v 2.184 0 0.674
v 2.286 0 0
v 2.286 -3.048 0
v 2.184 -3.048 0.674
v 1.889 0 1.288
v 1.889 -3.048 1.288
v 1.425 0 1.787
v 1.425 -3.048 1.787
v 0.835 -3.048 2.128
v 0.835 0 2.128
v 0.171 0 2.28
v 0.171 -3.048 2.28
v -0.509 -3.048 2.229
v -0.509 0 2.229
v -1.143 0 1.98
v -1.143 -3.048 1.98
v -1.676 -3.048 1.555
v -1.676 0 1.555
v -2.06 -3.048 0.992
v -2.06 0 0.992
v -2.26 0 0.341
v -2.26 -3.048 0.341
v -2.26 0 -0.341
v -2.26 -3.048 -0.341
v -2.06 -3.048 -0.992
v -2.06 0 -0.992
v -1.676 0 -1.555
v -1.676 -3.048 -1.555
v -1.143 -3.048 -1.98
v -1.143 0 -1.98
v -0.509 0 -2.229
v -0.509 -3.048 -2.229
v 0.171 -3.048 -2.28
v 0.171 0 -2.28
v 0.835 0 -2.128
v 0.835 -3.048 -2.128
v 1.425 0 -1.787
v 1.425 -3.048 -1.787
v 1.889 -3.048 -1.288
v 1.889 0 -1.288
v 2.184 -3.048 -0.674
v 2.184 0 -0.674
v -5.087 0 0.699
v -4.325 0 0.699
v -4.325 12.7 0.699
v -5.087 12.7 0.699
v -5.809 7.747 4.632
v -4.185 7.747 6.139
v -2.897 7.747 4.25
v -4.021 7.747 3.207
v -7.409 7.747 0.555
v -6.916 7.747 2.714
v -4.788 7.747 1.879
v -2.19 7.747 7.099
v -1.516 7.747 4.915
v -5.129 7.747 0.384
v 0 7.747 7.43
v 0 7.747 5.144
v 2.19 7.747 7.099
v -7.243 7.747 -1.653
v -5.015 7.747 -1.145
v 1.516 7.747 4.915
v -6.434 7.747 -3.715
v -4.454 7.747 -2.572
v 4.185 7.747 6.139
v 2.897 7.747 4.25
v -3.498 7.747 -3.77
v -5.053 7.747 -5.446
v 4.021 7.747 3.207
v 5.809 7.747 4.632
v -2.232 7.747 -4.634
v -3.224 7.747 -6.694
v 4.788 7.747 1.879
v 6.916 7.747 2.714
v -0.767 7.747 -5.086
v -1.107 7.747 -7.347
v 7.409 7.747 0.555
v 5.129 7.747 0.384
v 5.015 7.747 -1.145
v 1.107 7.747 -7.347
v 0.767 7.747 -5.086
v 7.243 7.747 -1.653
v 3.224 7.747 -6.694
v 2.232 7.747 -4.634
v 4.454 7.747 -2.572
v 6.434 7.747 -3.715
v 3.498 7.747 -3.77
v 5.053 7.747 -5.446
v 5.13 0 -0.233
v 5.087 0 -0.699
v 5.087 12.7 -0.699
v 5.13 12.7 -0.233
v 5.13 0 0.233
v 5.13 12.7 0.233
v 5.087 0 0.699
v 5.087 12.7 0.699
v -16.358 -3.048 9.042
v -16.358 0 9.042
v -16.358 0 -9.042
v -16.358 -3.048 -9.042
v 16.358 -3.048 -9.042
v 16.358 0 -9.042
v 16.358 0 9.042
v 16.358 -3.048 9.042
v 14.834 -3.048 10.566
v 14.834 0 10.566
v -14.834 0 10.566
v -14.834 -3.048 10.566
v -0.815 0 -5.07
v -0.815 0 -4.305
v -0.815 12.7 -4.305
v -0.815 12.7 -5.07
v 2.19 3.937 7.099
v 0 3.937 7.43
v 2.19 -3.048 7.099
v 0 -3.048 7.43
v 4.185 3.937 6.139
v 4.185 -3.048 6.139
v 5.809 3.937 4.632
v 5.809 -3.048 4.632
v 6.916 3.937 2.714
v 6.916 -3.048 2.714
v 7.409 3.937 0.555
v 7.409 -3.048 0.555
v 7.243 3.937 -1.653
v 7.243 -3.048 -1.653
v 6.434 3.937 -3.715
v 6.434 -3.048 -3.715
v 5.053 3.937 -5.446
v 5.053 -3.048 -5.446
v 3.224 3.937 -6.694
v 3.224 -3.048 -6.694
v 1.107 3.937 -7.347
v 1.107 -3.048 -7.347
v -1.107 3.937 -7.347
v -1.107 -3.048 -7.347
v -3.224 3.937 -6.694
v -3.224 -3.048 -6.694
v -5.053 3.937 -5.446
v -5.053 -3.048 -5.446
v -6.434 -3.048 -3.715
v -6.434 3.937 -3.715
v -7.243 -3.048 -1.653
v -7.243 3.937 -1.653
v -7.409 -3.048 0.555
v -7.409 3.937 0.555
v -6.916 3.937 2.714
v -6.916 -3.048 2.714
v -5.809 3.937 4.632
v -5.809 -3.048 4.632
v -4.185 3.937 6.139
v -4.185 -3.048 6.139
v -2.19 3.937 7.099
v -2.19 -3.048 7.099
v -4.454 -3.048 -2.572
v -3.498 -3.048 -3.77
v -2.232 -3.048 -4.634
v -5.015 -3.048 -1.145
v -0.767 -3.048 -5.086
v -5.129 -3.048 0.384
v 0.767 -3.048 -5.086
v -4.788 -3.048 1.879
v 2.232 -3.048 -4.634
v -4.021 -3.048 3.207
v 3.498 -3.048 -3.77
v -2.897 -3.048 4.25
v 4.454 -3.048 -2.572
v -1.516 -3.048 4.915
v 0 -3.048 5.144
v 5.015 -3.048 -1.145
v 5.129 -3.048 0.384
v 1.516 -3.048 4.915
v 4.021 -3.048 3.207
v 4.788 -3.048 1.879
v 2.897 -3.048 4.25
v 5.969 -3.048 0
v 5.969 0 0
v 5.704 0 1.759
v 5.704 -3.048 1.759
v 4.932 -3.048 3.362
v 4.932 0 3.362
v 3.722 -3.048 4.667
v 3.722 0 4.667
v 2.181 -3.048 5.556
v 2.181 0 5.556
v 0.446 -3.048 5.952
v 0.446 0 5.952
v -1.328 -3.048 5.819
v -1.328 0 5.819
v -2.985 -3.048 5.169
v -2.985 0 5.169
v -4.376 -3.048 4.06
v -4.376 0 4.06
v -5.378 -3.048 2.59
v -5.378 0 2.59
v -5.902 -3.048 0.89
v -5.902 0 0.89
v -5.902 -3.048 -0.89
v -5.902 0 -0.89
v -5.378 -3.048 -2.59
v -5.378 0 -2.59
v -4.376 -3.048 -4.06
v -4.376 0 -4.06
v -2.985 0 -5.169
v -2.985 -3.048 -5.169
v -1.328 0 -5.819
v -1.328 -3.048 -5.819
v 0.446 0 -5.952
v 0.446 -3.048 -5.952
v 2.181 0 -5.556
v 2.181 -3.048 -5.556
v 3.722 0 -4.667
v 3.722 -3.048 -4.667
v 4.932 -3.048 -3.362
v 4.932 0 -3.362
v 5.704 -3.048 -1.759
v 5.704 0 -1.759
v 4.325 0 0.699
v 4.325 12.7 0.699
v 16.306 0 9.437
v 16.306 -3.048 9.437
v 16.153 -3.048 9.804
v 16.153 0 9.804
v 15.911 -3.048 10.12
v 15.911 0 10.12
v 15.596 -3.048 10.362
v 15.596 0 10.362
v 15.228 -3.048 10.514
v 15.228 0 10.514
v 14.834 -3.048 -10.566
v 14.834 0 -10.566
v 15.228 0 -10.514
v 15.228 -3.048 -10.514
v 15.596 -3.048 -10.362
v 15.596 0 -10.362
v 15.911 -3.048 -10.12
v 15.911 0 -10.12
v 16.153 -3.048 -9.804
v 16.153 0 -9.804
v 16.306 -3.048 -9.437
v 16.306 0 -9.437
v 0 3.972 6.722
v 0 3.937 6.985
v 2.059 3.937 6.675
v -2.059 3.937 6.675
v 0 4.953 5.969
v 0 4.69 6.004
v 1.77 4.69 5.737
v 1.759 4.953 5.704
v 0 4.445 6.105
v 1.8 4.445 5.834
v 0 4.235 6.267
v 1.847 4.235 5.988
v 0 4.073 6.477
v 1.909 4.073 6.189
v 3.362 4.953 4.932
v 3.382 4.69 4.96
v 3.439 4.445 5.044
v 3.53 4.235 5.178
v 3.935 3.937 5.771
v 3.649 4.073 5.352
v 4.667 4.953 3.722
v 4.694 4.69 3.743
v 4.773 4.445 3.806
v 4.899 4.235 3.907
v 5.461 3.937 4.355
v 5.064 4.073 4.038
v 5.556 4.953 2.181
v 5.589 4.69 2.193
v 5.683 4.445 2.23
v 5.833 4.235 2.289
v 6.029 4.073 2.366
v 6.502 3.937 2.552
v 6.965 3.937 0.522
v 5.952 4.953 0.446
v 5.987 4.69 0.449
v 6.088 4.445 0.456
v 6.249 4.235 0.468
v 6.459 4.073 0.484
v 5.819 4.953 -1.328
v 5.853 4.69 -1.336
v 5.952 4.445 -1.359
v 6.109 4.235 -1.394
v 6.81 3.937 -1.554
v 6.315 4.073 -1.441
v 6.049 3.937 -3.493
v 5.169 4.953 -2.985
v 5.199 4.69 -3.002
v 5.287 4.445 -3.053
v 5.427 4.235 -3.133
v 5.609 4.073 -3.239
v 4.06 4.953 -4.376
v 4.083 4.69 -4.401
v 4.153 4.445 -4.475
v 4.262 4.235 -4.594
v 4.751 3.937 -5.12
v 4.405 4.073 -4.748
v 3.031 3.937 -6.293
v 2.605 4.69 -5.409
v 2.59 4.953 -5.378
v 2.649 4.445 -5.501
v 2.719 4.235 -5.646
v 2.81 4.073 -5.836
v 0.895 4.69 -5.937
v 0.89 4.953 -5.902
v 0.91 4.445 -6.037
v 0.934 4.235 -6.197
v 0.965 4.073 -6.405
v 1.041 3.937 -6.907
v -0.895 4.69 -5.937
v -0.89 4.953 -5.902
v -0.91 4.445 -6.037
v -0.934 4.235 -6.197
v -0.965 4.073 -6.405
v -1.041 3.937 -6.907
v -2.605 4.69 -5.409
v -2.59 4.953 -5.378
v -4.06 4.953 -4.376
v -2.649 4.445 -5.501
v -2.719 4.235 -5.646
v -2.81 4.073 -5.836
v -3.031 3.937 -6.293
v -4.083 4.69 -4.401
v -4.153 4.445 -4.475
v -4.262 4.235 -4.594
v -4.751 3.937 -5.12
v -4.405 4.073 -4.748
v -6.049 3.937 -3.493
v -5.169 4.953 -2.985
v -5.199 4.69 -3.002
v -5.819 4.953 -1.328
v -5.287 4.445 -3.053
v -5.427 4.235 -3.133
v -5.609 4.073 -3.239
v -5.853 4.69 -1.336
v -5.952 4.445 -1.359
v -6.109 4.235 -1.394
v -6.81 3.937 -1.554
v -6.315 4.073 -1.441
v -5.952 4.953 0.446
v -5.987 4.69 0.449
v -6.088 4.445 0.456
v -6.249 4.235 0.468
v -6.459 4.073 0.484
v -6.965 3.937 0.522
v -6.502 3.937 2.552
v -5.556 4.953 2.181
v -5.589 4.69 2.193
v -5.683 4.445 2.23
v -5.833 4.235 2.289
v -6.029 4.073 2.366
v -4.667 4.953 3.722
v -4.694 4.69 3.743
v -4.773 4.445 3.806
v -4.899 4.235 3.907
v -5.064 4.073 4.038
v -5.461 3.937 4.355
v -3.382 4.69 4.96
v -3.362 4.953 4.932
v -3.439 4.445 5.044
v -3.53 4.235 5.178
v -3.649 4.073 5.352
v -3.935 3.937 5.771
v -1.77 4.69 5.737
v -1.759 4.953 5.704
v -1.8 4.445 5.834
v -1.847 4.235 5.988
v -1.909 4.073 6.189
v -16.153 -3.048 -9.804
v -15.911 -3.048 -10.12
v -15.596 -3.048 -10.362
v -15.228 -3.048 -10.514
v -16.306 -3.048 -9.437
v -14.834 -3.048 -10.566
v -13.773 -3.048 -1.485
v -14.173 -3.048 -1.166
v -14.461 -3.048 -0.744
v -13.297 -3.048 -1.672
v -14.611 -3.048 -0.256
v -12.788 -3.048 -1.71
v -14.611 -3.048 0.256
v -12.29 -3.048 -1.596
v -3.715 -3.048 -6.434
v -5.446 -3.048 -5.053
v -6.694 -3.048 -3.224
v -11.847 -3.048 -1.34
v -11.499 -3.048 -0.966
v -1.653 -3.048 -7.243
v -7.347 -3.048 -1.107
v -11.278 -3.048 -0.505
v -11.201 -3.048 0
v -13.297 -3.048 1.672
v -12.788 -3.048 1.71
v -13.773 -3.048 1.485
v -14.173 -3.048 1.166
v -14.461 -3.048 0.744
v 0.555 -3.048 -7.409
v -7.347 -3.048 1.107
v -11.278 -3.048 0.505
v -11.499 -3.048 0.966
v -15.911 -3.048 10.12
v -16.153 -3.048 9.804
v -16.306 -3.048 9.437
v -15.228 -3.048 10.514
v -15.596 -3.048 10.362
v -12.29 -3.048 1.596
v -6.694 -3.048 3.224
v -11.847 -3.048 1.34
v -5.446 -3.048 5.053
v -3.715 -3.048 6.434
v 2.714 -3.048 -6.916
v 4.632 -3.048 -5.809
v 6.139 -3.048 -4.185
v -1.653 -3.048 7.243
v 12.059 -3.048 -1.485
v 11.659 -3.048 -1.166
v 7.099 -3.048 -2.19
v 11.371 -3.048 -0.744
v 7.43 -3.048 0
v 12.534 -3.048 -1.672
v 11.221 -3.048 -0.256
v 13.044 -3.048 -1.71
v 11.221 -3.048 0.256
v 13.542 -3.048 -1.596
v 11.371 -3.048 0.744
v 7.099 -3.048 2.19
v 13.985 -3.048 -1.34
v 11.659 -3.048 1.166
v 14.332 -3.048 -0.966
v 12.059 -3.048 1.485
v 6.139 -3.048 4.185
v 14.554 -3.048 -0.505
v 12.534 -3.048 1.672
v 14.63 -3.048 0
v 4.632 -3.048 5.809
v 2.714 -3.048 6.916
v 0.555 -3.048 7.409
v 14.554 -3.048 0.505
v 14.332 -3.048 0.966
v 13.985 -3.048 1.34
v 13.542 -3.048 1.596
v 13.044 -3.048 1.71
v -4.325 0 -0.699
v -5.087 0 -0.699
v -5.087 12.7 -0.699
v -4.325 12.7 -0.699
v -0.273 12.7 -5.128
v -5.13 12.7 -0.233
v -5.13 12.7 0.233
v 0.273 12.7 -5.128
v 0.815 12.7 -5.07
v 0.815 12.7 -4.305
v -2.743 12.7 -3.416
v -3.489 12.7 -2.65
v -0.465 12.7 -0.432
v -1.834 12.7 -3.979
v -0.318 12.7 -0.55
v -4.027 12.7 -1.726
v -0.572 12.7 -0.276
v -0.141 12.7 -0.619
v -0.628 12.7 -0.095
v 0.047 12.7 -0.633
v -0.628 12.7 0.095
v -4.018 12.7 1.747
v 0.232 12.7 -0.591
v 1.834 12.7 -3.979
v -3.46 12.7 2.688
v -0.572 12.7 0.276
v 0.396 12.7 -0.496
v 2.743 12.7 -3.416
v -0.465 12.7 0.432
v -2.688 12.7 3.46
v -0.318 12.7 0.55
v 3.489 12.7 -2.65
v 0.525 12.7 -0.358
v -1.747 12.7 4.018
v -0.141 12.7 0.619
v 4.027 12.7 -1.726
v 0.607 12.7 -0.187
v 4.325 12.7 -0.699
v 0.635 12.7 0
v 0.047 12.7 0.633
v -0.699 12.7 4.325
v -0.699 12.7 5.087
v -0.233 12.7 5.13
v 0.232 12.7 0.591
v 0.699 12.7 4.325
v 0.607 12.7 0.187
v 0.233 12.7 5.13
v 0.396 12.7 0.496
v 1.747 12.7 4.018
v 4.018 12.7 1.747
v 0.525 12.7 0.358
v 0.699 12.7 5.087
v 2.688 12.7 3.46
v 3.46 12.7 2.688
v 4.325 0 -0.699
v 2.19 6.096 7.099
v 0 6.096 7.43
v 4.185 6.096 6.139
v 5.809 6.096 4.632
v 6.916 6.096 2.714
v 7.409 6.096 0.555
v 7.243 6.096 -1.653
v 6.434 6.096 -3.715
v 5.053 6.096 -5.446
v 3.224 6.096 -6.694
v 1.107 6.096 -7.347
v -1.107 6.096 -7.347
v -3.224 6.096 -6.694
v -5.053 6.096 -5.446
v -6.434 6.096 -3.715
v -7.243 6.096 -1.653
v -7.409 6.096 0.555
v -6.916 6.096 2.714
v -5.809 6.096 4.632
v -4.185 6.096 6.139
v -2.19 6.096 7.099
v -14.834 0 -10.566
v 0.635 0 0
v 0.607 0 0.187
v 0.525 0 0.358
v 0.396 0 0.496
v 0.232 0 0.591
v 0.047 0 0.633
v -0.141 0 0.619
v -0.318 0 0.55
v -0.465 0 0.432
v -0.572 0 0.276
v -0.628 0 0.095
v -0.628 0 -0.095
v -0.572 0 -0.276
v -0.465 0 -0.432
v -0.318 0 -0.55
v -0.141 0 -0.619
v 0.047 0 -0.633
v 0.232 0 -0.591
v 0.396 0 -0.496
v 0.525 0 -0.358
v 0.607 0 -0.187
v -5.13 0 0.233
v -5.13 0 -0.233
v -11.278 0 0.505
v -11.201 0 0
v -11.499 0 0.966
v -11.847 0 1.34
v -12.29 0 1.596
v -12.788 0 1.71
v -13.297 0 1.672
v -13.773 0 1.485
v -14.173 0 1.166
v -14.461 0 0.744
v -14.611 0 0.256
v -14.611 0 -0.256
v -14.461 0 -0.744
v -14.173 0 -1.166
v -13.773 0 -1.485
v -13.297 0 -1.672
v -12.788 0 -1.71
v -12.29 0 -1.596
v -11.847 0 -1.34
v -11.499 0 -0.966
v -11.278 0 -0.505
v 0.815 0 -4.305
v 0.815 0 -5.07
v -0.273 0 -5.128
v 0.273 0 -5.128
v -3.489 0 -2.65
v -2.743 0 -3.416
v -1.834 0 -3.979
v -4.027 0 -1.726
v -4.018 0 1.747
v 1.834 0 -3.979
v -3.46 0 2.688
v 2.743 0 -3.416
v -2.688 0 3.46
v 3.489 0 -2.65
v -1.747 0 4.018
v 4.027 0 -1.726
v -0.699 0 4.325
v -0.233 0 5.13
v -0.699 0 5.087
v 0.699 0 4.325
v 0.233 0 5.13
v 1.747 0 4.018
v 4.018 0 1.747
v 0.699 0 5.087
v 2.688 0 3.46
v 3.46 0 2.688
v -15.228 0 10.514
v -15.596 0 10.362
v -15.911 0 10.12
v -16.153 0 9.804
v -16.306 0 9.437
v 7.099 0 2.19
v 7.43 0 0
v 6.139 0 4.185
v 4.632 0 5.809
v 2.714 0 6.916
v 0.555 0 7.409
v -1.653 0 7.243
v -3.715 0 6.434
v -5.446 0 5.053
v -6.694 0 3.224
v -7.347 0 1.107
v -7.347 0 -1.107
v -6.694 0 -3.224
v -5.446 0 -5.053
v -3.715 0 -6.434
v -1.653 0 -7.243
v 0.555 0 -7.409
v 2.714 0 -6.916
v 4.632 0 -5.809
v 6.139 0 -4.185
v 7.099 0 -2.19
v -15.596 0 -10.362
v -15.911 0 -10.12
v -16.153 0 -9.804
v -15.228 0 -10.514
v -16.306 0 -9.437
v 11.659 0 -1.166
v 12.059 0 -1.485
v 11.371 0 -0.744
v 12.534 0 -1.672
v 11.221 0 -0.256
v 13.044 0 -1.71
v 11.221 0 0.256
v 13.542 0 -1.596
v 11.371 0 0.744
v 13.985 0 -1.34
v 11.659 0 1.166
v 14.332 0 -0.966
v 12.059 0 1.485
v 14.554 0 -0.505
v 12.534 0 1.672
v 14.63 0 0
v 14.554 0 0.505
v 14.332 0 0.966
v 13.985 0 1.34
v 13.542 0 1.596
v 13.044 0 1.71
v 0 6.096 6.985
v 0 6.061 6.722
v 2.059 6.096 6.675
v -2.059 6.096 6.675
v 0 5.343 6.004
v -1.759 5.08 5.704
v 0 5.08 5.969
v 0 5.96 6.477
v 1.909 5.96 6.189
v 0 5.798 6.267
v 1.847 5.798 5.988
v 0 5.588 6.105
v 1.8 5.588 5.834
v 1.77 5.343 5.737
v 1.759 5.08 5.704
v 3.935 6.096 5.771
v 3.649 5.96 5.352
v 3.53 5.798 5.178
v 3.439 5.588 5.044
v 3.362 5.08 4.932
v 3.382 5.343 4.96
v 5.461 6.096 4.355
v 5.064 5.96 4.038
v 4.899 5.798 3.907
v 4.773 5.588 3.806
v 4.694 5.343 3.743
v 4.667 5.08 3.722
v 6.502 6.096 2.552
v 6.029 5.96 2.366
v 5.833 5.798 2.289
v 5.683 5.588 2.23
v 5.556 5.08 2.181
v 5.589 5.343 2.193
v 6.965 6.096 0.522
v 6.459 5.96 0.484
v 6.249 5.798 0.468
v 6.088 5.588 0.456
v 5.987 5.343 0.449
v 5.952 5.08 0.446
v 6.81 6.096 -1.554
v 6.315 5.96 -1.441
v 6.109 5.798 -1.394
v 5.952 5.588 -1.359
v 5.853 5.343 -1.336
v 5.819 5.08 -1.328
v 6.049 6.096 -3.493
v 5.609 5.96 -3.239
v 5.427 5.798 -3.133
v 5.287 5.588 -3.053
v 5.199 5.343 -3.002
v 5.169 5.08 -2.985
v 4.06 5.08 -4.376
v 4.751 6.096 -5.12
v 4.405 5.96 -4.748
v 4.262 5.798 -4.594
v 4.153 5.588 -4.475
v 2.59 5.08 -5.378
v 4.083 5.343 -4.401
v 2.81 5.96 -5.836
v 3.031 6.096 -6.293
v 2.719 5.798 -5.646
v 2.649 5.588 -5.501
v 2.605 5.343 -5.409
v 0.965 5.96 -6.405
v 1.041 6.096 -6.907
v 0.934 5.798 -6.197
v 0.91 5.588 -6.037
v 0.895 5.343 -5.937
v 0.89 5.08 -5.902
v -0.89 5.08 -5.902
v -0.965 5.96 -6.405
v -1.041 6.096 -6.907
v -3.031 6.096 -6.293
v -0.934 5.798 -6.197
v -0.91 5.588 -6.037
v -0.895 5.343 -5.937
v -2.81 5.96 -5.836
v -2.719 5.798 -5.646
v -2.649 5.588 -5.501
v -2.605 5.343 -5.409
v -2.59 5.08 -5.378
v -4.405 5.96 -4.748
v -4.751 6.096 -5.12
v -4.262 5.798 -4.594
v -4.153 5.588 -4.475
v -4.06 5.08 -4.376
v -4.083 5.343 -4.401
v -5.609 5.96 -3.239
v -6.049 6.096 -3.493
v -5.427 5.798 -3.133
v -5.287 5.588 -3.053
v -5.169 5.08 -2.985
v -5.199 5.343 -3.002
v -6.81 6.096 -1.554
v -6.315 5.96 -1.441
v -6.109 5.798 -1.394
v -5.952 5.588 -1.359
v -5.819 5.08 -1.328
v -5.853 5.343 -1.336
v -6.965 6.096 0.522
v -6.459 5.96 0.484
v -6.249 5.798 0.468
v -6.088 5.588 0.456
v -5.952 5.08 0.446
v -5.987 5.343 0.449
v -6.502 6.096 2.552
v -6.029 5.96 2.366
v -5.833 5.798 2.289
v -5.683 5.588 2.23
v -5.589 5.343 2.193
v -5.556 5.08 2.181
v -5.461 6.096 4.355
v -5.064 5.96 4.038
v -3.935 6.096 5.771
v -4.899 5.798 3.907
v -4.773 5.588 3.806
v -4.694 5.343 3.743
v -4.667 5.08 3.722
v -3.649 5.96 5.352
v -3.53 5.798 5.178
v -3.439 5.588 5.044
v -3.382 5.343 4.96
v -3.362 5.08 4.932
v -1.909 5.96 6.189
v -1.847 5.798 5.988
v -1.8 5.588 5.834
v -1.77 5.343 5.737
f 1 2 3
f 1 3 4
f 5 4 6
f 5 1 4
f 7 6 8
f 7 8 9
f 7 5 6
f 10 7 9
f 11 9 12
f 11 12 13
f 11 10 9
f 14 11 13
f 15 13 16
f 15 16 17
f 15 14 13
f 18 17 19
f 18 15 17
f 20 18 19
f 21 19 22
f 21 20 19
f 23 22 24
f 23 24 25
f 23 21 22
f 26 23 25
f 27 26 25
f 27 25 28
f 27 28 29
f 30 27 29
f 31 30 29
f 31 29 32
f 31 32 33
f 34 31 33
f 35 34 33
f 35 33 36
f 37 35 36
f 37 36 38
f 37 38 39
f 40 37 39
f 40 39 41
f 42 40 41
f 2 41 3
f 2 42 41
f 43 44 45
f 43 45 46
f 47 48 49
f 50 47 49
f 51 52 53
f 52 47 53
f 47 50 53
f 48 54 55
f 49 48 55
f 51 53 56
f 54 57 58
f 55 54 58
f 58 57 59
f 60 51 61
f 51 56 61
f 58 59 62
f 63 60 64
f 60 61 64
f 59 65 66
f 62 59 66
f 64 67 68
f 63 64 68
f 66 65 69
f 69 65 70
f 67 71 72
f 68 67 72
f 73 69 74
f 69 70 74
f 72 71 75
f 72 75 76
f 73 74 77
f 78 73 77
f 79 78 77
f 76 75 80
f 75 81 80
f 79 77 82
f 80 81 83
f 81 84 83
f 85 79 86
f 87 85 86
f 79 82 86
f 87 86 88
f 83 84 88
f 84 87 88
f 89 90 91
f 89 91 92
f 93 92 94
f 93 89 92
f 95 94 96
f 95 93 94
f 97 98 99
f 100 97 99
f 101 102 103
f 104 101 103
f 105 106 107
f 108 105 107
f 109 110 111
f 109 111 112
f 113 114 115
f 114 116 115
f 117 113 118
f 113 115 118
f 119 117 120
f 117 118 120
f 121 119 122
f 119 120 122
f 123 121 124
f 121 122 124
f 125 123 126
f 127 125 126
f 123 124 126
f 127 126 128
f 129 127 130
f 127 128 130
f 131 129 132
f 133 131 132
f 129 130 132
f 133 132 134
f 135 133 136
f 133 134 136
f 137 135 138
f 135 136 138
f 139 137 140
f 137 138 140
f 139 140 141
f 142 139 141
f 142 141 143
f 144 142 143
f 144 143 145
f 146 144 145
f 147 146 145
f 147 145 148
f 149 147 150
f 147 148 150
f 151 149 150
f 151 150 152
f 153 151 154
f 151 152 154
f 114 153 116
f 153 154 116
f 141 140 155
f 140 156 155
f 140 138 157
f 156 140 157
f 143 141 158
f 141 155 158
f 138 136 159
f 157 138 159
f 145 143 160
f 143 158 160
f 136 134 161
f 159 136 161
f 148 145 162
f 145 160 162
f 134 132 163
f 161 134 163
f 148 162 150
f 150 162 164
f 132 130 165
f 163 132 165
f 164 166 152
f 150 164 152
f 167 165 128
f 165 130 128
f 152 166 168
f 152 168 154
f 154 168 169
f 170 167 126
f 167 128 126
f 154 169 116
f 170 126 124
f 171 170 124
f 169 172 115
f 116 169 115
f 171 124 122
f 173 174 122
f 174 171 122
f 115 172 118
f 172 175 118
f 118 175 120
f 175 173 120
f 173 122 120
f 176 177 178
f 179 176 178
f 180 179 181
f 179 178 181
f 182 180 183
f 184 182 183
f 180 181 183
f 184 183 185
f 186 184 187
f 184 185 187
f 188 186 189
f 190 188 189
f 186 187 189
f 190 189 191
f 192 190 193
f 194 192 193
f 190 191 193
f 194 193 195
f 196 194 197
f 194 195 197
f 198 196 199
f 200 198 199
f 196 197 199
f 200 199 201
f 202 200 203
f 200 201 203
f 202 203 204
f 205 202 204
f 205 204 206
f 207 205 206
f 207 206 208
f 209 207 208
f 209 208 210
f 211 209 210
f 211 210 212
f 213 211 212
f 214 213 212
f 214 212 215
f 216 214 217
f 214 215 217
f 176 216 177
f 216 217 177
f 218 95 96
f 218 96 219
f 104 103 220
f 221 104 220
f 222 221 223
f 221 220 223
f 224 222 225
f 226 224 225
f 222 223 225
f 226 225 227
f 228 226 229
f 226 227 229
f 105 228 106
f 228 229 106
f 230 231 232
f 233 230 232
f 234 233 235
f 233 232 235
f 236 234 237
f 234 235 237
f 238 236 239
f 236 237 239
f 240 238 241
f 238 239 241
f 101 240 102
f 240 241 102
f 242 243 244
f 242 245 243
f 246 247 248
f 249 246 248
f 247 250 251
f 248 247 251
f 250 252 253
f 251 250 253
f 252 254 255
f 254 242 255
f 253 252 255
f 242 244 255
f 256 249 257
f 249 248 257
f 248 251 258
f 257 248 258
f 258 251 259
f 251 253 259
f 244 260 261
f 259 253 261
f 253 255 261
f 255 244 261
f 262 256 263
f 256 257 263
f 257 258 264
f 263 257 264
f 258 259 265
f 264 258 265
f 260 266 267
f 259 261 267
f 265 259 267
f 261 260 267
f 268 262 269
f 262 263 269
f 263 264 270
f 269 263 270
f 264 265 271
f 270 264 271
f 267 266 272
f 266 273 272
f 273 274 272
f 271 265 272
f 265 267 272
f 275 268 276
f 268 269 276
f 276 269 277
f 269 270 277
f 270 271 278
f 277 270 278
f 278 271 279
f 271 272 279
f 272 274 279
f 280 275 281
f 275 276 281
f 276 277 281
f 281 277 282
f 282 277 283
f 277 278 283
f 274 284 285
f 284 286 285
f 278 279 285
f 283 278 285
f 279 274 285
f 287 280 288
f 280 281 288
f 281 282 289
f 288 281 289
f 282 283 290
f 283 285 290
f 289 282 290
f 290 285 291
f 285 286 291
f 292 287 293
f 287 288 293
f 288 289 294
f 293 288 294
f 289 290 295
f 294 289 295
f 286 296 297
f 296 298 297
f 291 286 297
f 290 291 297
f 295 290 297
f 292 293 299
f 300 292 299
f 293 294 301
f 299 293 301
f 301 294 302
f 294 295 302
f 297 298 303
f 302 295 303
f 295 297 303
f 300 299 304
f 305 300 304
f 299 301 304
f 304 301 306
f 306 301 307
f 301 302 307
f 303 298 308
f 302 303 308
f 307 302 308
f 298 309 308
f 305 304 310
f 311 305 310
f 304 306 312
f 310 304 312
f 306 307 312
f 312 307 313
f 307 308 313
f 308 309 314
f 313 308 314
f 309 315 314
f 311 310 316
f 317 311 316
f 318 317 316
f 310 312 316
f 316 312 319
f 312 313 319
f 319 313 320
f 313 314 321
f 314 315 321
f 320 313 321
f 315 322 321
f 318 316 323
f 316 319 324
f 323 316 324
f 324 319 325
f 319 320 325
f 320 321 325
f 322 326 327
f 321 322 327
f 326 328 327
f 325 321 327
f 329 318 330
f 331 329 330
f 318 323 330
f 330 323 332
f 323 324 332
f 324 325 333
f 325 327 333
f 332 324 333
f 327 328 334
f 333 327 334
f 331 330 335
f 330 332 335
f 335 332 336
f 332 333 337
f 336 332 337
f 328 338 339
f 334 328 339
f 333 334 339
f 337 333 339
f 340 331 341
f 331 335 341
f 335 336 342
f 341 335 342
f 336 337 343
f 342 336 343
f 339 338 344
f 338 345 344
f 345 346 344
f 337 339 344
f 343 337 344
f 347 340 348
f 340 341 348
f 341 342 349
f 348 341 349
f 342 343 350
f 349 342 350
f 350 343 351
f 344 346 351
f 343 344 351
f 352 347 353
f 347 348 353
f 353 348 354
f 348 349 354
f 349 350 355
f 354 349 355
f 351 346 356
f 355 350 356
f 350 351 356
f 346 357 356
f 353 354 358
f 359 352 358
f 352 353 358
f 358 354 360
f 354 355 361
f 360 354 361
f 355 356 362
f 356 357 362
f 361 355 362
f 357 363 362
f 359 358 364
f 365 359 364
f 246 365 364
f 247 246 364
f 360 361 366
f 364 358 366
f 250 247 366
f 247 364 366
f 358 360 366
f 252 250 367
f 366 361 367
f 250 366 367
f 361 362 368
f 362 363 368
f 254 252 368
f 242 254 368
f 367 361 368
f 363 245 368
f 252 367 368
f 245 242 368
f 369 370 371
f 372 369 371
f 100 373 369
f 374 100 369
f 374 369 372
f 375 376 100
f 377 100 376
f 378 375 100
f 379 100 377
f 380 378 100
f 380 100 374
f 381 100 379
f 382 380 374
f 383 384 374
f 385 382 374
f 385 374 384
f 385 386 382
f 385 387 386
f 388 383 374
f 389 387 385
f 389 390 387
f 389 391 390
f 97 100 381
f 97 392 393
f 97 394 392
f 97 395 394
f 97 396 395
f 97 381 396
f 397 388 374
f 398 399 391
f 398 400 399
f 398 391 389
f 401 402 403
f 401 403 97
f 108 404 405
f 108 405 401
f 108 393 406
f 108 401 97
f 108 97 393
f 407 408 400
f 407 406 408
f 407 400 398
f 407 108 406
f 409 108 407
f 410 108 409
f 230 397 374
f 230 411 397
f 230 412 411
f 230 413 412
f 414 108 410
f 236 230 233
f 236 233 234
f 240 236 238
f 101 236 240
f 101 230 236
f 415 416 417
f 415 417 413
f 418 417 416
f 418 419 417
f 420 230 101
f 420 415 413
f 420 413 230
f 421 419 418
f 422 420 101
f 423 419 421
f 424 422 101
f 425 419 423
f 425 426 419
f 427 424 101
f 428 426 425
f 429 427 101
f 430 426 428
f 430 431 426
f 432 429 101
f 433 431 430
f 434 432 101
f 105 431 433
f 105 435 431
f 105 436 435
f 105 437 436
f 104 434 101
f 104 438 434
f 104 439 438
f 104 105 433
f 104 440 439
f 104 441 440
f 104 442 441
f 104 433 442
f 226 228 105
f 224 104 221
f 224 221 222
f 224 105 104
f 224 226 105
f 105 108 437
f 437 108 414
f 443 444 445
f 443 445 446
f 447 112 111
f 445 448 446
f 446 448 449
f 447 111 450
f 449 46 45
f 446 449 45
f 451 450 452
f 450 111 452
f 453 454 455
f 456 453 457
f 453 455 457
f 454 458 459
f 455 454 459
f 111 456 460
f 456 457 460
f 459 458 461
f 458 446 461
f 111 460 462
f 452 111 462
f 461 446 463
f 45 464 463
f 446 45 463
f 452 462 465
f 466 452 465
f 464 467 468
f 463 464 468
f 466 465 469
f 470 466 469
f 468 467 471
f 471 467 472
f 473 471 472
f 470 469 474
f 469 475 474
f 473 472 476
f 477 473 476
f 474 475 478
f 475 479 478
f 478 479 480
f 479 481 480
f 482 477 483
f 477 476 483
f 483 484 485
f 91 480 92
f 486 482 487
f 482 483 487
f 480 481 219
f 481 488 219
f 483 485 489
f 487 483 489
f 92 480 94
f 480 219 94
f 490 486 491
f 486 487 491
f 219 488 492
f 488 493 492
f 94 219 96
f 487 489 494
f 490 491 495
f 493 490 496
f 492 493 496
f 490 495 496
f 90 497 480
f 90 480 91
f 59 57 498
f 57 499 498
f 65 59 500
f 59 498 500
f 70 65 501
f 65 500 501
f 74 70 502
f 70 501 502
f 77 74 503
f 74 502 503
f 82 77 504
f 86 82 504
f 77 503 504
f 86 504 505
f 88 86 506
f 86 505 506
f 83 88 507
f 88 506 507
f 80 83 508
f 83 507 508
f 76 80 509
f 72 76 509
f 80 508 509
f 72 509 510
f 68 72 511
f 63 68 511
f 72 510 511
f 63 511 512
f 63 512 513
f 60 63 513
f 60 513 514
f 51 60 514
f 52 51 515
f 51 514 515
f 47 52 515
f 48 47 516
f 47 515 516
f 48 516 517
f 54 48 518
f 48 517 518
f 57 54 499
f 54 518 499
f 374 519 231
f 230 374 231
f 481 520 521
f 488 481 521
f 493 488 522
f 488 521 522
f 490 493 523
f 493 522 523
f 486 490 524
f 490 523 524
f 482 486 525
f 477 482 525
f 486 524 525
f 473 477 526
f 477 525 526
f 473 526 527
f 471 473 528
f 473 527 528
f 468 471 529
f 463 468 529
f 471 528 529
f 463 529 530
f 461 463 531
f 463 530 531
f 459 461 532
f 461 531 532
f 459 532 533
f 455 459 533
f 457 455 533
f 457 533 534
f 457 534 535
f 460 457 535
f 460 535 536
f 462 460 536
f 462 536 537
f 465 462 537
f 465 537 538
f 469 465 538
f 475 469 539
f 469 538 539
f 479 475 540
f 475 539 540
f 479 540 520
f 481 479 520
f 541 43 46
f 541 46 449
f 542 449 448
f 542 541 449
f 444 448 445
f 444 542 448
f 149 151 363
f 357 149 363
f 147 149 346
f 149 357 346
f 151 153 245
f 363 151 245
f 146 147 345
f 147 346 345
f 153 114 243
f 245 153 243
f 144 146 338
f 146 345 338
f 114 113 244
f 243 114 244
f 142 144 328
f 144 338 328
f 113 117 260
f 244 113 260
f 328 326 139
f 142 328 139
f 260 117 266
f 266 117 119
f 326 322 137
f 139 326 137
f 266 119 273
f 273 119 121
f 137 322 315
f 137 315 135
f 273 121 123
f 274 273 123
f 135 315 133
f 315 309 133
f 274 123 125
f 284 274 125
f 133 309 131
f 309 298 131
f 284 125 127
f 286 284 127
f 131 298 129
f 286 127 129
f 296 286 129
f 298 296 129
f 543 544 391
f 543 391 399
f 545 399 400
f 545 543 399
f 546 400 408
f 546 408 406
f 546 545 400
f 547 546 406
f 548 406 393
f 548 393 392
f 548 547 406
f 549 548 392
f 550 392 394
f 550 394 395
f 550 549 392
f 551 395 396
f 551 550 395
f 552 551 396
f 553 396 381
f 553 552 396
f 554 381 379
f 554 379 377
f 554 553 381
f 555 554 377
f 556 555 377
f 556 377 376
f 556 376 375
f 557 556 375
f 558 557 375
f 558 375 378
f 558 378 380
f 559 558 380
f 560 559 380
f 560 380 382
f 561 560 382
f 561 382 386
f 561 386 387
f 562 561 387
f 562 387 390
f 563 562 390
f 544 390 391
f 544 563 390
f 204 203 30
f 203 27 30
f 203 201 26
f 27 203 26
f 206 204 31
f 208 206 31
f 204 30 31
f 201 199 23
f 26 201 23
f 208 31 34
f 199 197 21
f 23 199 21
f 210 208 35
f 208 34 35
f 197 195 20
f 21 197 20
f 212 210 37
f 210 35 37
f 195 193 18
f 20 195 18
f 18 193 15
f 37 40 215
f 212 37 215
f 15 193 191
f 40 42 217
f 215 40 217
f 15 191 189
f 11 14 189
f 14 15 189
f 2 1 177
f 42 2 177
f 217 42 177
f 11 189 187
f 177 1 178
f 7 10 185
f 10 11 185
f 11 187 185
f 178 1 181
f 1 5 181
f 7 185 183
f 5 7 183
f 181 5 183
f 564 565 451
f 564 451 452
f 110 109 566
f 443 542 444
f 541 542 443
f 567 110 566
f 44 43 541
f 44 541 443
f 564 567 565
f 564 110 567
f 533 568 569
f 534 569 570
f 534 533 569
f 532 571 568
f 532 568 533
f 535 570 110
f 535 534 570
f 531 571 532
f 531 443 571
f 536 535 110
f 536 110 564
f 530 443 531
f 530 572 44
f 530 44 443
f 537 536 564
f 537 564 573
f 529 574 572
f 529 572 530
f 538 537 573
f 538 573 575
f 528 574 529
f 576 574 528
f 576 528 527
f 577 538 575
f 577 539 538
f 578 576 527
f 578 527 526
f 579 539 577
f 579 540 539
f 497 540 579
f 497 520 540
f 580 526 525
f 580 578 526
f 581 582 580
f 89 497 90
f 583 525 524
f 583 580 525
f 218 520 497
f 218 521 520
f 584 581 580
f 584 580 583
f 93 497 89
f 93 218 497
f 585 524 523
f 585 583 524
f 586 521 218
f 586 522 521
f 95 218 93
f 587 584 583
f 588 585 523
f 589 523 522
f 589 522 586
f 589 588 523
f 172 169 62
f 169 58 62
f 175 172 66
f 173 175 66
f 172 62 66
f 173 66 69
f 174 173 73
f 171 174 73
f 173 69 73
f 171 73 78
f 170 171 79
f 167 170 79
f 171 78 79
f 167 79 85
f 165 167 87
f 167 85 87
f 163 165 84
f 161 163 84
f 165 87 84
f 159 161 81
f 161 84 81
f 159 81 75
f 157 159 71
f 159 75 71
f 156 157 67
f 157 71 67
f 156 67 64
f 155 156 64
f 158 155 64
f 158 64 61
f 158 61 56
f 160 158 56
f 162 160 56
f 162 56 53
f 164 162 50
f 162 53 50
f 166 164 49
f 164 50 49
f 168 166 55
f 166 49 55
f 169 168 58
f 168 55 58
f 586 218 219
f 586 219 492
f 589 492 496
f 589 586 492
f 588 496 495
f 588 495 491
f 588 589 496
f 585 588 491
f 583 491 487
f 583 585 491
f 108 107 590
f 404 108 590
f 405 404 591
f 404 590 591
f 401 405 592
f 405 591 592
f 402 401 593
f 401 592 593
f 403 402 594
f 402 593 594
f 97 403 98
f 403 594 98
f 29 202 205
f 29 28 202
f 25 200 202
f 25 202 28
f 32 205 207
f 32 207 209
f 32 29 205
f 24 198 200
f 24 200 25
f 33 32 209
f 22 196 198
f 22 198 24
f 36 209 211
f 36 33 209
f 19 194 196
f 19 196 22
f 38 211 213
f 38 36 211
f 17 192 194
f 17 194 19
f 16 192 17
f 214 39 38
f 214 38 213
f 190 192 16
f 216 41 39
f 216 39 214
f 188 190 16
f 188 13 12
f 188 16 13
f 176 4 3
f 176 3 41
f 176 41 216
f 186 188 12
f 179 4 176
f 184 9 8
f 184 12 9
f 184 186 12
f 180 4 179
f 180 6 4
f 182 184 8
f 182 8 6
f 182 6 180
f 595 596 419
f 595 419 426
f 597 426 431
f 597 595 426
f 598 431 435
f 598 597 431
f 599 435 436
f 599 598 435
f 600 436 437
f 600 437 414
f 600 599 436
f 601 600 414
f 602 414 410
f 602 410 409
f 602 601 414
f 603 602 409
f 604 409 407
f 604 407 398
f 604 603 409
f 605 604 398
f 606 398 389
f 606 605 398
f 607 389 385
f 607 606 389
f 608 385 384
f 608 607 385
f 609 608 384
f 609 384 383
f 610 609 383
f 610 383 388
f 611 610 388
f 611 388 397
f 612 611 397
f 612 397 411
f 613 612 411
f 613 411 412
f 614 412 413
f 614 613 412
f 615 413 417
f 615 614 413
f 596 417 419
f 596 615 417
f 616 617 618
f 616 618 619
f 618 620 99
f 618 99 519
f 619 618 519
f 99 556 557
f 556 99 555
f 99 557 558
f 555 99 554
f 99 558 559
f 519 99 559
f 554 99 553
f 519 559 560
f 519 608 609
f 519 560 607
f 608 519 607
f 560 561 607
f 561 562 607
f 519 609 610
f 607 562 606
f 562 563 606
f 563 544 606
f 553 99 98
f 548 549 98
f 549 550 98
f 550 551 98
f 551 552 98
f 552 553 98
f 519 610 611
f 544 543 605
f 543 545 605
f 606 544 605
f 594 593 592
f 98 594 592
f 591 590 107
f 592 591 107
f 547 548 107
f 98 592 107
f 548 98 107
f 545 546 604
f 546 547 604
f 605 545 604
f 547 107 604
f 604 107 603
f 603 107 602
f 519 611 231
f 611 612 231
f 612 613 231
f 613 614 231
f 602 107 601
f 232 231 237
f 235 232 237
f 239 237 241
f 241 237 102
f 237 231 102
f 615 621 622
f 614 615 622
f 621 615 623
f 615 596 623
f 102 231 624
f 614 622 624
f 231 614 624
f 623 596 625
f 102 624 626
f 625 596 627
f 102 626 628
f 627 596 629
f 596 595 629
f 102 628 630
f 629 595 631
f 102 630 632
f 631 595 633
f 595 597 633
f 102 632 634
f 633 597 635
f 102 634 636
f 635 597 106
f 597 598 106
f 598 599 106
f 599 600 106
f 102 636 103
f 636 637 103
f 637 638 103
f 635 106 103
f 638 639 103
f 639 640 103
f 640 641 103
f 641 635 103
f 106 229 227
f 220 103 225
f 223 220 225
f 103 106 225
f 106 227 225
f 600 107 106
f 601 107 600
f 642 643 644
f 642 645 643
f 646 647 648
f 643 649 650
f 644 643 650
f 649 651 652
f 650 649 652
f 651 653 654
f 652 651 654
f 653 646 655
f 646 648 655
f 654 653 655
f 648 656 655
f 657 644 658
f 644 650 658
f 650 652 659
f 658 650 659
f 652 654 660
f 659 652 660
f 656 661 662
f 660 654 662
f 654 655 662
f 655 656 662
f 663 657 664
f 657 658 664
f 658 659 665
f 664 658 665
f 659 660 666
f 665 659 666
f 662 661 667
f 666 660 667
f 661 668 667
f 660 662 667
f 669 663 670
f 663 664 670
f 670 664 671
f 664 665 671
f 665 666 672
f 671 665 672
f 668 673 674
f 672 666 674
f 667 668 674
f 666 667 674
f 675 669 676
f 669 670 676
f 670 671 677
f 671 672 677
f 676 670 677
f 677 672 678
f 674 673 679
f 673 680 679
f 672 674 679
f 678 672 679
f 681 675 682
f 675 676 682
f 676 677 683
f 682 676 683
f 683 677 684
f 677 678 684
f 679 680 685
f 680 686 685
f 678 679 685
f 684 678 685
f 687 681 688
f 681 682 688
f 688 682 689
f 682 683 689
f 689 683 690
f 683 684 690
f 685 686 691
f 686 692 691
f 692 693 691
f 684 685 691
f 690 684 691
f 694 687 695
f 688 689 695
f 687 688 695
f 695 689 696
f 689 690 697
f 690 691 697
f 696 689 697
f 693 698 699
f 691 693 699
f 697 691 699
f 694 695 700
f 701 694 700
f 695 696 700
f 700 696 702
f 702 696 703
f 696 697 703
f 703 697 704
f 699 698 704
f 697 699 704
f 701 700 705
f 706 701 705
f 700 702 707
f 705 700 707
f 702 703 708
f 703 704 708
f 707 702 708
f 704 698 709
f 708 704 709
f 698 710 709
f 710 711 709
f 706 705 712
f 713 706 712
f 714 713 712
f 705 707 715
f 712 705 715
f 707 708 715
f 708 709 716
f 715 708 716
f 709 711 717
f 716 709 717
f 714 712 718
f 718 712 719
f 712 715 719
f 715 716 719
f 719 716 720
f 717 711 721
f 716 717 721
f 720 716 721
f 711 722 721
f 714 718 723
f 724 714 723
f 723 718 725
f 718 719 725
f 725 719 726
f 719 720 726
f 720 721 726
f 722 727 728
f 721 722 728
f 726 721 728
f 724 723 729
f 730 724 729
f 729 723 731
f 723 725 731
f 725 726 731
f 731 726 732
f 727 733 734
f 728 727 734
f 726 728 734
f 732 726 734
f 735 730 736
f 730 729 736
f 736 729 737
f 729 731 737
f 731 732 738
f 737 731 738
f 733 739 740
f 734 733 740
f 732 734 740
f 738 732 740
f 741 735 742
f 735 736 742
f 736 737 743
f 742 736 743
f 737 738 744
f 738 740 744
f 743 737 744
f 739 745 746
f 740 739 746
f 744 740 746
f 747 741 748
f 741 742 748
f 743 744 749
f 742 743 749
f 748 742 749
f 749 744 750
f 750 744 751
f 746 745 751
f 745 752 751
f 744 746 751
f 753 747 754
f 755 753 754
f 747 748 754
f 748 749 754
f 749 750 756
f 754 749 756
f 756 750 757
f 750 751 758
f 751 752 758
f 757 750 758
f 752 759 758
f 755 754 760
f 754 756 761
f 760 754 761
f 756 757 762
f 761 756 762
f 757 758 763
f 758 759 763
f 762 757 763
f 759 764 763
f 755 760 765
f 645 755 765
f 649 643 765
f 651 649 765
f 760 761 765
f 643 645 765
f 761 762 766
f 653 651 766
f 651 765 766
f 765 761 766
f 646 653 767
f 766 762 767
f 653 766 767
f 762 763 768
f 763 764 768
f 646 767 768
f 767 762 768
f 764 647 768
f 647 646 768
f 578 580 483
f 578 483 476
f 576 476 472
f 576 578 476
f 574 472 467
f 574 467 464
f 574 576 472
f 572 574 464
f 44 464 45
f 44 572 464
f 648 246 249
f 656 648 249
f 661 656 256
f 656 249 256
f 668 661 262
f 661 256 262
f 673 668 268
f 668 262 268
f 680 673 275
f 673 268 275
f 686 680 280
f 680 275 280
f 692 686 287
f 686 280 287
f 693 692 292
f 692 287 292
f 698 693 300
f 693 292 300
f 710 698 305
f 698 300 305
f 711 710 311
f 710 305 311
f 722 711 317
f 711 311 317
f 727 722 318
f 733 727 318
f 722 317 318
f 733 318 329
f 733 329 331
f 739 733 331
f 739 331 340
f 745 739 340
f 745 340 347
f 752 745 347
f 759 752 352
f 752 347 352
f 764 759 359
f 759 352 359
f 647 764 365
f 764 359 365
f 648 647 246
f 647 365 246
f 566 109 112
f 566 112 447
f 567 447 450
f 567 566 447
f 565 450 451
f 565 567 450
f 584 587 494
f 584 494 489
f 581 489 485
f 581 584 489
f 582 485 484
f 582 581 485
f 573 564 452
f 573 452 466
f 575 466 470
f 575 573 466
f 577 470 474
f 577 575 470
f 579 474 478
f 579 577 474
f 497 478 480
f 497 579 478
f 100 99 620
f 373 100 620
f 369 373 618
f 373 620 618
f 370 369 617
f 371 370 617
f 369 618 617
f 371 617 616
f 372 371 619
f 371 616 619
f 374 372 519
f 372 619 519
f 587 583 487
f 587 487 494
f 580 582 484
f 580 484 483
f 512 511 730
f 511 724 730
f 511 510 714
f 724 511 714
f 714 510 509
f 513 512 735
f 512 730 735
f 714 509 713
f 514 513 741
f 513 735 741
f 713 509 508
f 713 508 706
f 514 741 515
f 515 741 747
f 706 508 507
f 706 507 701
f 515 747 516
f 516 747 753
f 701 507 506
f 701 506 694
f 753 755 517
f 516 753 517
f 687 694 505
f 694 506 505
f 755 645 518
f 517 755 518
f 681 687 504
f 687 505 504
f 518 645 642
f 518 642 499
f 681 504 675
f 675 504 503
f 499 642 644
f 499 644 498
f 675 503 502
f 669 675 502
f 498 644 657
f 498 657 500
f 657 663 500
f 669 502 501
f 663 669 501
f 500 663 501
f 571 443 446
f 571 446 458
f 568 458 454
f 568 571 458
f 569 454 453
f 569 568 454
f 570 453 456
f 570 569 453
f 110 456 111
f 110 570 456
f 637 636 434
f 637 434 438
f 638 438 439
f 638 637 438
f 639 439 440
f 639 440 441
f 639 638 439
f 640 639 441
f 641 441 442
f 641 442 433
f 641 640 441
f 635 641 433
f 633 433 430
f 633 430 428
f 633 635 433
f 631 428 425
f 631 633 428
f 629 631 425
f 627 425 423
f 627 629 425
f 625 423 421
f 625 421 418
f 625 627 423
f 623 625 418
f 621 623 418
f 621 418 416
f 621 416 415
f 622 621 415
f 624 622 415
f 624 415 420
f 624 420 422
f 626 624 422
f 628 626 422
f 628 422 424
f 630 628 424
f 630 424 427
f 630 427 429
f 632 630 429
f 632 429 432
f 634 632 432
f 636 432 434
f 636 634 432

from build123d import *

# Parameters (mm, degrees)
F0_R     = 1.7145
F0_R_2   = 7.4295
F1_DEPTH = 3.048
F0_R_3   = 2.286
F0_R_4   = 2.032
F0_R_5   = 0.635
F2_DEPTH = 12.7
F0_R_6   = 5.969
F3_DEPTH = 3.048
F6_R     = 1.016


# Not quite as in the source:
# - a feature of the source that left no trace in its solid (it failed there, or was rolled back) is left out
# - a feature names something its author has since deleted; it is built from what else it names
# - the program builds the solid bodies; features that only make, move or delete a surface that nothing else refers to are left out


with BuildPart() as f1:
    # F0 (on Front) → F1 (new body)
    with BuildSketch(Plane.XZ):
        with BuildLine():
            ThreePointArc((16.3576, 9.0424), (15.9112307345, 10.1200307345), (14.8336, 10.5664))
            Line((14.8336, 10.5664), (-14.8336, 10.5664))
            ThreePointArc((-14.8336, 10.5664), (-15.9112307345, 10.1200307345), (-16.3576, 9.0424))
            Line((-16.3576, 9.0424), (-16.3576, -9.0424))
            ThreePointArc((-16.3576, -9.0424), (-15.9112307345, -10.1200307345), (-14.8336, -10.5664))
            Line((-14.8336, -10.5664), (14.8336, -10.5664))
            ThreePointArc((14.8336, -10.5664), (15.9112307345, -10.1200307345), (16.3576, -9.0424))
            Line((16.3576, -9.0424), (16.3576, 9.0424))
        make_face()
        with Locations((-12.9159, 0)):
            Circle(F0_R, mode=Mode.SUBTRACT)
        Circle(F0_R_2, mode=Mode.SUBTRACT)
        with Locations((12.9159, 0)):
            Circle(F0_R, mode=Mode.SUBTRACT)
    extrude(amount=F1_DEPTH)


with BuildPart() as f2:
    # F0 (on Front) → F2 (new body)
    with BuildSketch(Plane.XZ):
        with BuildLine():
            ThreePointArc((4.3254641369, -0.6985), (4.3674685669, -0.3503720408), (4.3815, 0))
            ThreePointArc((4.3815, 0), (4.3674685669, 0.3503720408), (4.3254641369, 0.6985))
            ThreePointArc((4.3254641369, 0.6985), (3.0981883618, 3.0981883618), (0.6985, 4.3254641369))
            ThreePointArc((0.6985, 4.3254641369), (0, 4.3815), (-0.6985, 4.3254641369))
            ThreePointArc((-0.6985, 4.3254641369), (-3.0981883618, 3.0981883618), (-4.3254641369, 0.6985))
            ThreePointArc((-4.3254641369, 0.6985), (-4.3815, 0), (-4.3254641369, -0.6985))
            ThreePointArc((-4.3254641369, -0.6985), (-3.139825836, -3.0559836338), (-0.8152878707, -4.3049794352))
            ThreePointArc((-0.8152878707, -4.3049794352), (0, -4.3815), (0.8152878707, -4.3049794352))
            ThreePointArc((0.8152878707, -4.3049794352), (3.139825836, -3.0559836338), (4.3254641369, -0.6985))
        make_face()
        Circle(F0_R_3, mode=Mode.SUBTRACT)
        Circle(F0_R_3)
        Circle(F0_R_4, mode=Mode.SUBTRACT)
        Circle(F0_R_4)
        Circle(F0_R_5, mode=Mode.SUBTRACT)
        with BuildLine():
            Line((0.8152878707, -5.0700591005), (0.8152878707, -4.3049794352))
            ThreePointArc((0.8152878707, -4.3049794352), (0, -4.3815), (-0.8152878707, -4.3049794352))
            Line((-0.8152878707, -4.3049794352), (-0.8152878707, -5.0700591005))
            ThreePointArc((-0.8152878707, -5.0700591005), (0, -5.1351916804), (0.8152878707, -5.0700591005))
        make_face()
        with BuildLine():
            ThreePointArc((4.3254641369, 0.6985), (4.3674685669, 0.3503720408), (4.3815, 0))
            ThreePointArc((4.3815, 0), (4.3674685669, -0.3503720408), (4.3254641369, -0.6985))
            Line((4.3254641369, -0.6985), (5.0874641369, -0.6985))
            ThreePointArc((5.0874641369, -0.6985), (5.1351916804, 0), (5.0874641369, 0.6985))
            Line((5.0874641369, 0.6985), (4.3254641369, 0.6985))
        make_face()
        with BuildLine():
            ThreePointArc((-0.6985, 4.3254641369), (0, 4.3815), (0.6985, 4.3254641369))
            Line((0.6985, 4.3254641369), (0.6985, 5.0874641369))
            ThreePointArc((0.6985, 5.0874641369), (0, 5.1351916804), (-0.6985, 5.0874641369))
            Line((-0.6985, 5.0874641369), (-0.6985, 4.3254641369))
        make_face()
        with BuildLine():
            ThreePointArc((-4.3254641369, -0.6985), (-4.3815, 0), (-4.3254641369, 0.6985))
            Line((-4.3254641369, 0.6985), (-5.0874641369, 0.6985))
            ThreePointArc((-5.0874641369, 0.6985), (-5.1351916804, 0), (-5.0874641369, -0.6985))
            Line((-5.0874641369, -0.6985), (-4.3254641369, -0.6985))
        make_face()
    extrude(amount=-F2_DEPTH)


with BuildPart() as f3:
    # F0 (on Front) → F3 (new body)
    with BuildSketch(Plane.XZ):
        Circle(F0_R_6)
        with BuildLine():
            ThreePointArc((0.6985, 5.0874641369), (3.6311288599, 3.6311288599), (5.0874641369, 0.6985))
            ThreePointArc((5.0874641369, 0.6985), (5.1351916804, 0), (5.0874641369, -0.6985))
            ThreePointArc((5.0874641369, -0.6985), (3.6726356419, -3.5891421031), (0.8152878707, -5.0700591005))
            ThreePointArc((0.8152878707, -5.0700591005), (0, -5.1351916804), (-0.8152878707, -5.0700591005))
            ThreePointArc((-0.8152878707, -5.0700591005), (-3.6726356419, -3.5891421031), (-5.0874641369, -0.6985))
            ThreePointArc((-5.0874641369, -0.6985), (-5.1351916804, 0), (-5.0874641369, 0.6985))
            ThreePointArc((-5.0874641369, 0.6985), (-3.6311288599, 3.6311288599), (-0.6985, 5.0874641369))
            ThreePointArc((-0.6985, 5.0874641369), (0, 5.1351916804), (0.6985, 5.0874641369))
        make_face(mode=Mode.SUBTRACT)
        with BuildLine():
            ThreePointArc((4.3254641369, -0.6985), (4.3674685669, -0.3503720408), (4.3815, 0))
            ThreePointArc((4.3815, 0), (4.3674685669, 0.3503720408), (4.3254641369, 0.6985))
            ThreePointArc((4.3254641369, 0.6985), (3.0981883618, 3.0981883618), (0.6985, 4.3254641369))
            ThreePointArc((0.6985, 4.3254641369), (0, 4.3815), (-0.6985, 4.3254641369))
            ThreePointArc((-0.6985, 4.3254641369), (-3.0981883618, 3.0981883618), (-4.3254641369, 0.6985))
            ThreePointArc((-4.3254641369, 0.6985), (-4.3815, 0), (-4.3254641369, -0.6985))
            ThreePointArc((-4.3254641369, -0.6985), (-3.139825836, -3.0559836338), (-0.8152878707, -4.3049794352))
            ThreePointArc((-0.8152878707, -4.3049794352), (0, -4.3815), (0.8152878707, -4.3049794352))
            ThreePointArc((0.8152878707, -4.3049794352), (3.139825836, -3.0559836338), (4.3254641369, -0.6985))
        make_face()
        Circle(F0_R_3, mode=Mode.SUBTRACT)
        with BuildLine():
            ThreePointArc((0.6985, 4.3254641369), (3.0981883618, 3.0981883618), (4.3254641369, 0.6985))
            Line((4.3254641369, 0.6985), (5.0874641369, 0.6985))
            ThreePointArc((5.0874641369, 0.6985), (3.6311288599, 3.6311288599), (0.6985, 5.0874641369))
            Line((0.6985, 5.0874641369), (0.6985, 4.3254641369))
        make_face()
        with BuildLine():
            ThreePointArc((-4.3254641369, 0.6985), (-3.0981883618, 3.0981883618), (-0.6985, 4.3254641369))
            Line((-0.6985, 4.3254641369), (-0.6985, 5.0874641369))
            ThreePointArc((-0.6985, 5.0874641369), (-3.6311288599, 3.6311288599), (-5.0874641369, 0.6985))
            Line((-5.0874641369, 0.6985), (-4.3254641369, 0.6985))
        make_face()
        with BuildLine():
            Line((5.0874641369, -0.6985), (4.3254641369, -0.6985))
            ThreePointArc((4.3254641369, -0.6985), (3.139825836, -3.0559836338), (0.8152878707, -4.3049794352))
            Line((0.8152878707, -4.3049794352), (0.8152878707, -5.0700591005))
            ThreePointArc((0.8152878707, -5.0700591005), (3.6726356419, -3.5891421031), (5.0874641369, -0.6985))
        make_face()
        with BuildLine():
            Line((-0.8152878707, -5.0700591005), (-0.8152878707, -4.3049794352))
            ThreePointArc((-0.8152878707, -4.3049794352), (-3.139825836, -3.0559836338), (-4.3254641369, -0.6985))
            Line((-4.3254641369, -0.6985), (-5.0874641369, -0.6985))
            ThreePointArc((-5.0874641369, -0.6985), (-3.6726356419, -3.5891421031), (-0.8152878707, -5.0700591005))
        make_face()
        with BuildLine():
            Line((0.8152878707, -5.0700591005), (0.8152878707, -4.3049794352))
            ThreePointArc((0.8152878707, -4.3049794352), (0, -4.3815), (-0.8152878707, -4.3049794352))
            Line((-0.8152878707, -4.3049794352), (-0.8152878707, -5.0700591005))
            ThreePointArc((-0.8152878707, -5.0700591005), (0, -5.1351916804), (0.8152878707, -5.0700591005))
        make_face()
        with BuildLine():
            ThreePointArc((4.3254641369, 0.6985), (4.3674685669, 0.3503720408), (4.3815, 0))
            ThreePointArc((4.3815, 0), (4.3674685669, -0.3503720408), (4.3254641369, -0.6985))
            Line((4.3254641369, -0.6985), (5.0874641369, -0.6985))
            ThreePointArc((5.0874641369, -0.6985), (5.1351916804, 0), (5.0874641369, 0.6985))
            Line((5.0874641369, 0.6985), (4.3254641369, 0.6985))
        make_face()
        with BuildLine():
            ThreePointArc((-4.3254641369, -0.6985), (-4.3815, 0), (-4.3254641369, 0.6985))
            Line((-4.3254641369, 0.6985), (-5.0874641369, 0.6985))
            ThreePointArc((-5.0874641369, 0.6985), (-5.1351916804, 0), (-5.0874641369, -0.6985))
            Line((-5.0874641369, -0.6985), (-4.3254641369, -0.6985))
        make_face()
        with BuildLine():
            ThreePointArc((-0.6985, 4.3254641369), (0, 4.3815), (0.6985, 4.3254641369))
            Line((0.6985, 4.3254641369), (0.6985, 5.0874641369))
            ThreePointArc((0.6985, 5.0874641369), (0, 5.1351916804), (-0.6985, 5.0874641369))
            Line((-0.6985, 5.0874641369), (-0.6985, 4.3254641369))
        make_face()
    extrude(amount=F3_DEPTH)


with BuildPart() as f5:
    # F4 (on Right) → F5 (revolve)
    with BuildSketch(Plane.YZ):
        Polygon((-3.048, 7.4295), (-3.048, 5.1435), (7.747, 5.1435), (7.747, 7.4295), (6.096, 7.4295), (6.096, 5.969), (3.937, 5.969), (3.937, 7.4295), align=None)
    revolve(axis=Axis((0, 9.7803371027, 0), (0, 1, 0)))

    # F6
    f6_edges = [f5.edges().sort_by_distance(p)[0] for p in [
        (0, 6.096, -5.969),
        (0, 3.937, -5.969),
    ]]
    fillet(f6_edges, radius=F6_R)


solid = Compound([f1.part, f2.part, f3.part, f5.part])
